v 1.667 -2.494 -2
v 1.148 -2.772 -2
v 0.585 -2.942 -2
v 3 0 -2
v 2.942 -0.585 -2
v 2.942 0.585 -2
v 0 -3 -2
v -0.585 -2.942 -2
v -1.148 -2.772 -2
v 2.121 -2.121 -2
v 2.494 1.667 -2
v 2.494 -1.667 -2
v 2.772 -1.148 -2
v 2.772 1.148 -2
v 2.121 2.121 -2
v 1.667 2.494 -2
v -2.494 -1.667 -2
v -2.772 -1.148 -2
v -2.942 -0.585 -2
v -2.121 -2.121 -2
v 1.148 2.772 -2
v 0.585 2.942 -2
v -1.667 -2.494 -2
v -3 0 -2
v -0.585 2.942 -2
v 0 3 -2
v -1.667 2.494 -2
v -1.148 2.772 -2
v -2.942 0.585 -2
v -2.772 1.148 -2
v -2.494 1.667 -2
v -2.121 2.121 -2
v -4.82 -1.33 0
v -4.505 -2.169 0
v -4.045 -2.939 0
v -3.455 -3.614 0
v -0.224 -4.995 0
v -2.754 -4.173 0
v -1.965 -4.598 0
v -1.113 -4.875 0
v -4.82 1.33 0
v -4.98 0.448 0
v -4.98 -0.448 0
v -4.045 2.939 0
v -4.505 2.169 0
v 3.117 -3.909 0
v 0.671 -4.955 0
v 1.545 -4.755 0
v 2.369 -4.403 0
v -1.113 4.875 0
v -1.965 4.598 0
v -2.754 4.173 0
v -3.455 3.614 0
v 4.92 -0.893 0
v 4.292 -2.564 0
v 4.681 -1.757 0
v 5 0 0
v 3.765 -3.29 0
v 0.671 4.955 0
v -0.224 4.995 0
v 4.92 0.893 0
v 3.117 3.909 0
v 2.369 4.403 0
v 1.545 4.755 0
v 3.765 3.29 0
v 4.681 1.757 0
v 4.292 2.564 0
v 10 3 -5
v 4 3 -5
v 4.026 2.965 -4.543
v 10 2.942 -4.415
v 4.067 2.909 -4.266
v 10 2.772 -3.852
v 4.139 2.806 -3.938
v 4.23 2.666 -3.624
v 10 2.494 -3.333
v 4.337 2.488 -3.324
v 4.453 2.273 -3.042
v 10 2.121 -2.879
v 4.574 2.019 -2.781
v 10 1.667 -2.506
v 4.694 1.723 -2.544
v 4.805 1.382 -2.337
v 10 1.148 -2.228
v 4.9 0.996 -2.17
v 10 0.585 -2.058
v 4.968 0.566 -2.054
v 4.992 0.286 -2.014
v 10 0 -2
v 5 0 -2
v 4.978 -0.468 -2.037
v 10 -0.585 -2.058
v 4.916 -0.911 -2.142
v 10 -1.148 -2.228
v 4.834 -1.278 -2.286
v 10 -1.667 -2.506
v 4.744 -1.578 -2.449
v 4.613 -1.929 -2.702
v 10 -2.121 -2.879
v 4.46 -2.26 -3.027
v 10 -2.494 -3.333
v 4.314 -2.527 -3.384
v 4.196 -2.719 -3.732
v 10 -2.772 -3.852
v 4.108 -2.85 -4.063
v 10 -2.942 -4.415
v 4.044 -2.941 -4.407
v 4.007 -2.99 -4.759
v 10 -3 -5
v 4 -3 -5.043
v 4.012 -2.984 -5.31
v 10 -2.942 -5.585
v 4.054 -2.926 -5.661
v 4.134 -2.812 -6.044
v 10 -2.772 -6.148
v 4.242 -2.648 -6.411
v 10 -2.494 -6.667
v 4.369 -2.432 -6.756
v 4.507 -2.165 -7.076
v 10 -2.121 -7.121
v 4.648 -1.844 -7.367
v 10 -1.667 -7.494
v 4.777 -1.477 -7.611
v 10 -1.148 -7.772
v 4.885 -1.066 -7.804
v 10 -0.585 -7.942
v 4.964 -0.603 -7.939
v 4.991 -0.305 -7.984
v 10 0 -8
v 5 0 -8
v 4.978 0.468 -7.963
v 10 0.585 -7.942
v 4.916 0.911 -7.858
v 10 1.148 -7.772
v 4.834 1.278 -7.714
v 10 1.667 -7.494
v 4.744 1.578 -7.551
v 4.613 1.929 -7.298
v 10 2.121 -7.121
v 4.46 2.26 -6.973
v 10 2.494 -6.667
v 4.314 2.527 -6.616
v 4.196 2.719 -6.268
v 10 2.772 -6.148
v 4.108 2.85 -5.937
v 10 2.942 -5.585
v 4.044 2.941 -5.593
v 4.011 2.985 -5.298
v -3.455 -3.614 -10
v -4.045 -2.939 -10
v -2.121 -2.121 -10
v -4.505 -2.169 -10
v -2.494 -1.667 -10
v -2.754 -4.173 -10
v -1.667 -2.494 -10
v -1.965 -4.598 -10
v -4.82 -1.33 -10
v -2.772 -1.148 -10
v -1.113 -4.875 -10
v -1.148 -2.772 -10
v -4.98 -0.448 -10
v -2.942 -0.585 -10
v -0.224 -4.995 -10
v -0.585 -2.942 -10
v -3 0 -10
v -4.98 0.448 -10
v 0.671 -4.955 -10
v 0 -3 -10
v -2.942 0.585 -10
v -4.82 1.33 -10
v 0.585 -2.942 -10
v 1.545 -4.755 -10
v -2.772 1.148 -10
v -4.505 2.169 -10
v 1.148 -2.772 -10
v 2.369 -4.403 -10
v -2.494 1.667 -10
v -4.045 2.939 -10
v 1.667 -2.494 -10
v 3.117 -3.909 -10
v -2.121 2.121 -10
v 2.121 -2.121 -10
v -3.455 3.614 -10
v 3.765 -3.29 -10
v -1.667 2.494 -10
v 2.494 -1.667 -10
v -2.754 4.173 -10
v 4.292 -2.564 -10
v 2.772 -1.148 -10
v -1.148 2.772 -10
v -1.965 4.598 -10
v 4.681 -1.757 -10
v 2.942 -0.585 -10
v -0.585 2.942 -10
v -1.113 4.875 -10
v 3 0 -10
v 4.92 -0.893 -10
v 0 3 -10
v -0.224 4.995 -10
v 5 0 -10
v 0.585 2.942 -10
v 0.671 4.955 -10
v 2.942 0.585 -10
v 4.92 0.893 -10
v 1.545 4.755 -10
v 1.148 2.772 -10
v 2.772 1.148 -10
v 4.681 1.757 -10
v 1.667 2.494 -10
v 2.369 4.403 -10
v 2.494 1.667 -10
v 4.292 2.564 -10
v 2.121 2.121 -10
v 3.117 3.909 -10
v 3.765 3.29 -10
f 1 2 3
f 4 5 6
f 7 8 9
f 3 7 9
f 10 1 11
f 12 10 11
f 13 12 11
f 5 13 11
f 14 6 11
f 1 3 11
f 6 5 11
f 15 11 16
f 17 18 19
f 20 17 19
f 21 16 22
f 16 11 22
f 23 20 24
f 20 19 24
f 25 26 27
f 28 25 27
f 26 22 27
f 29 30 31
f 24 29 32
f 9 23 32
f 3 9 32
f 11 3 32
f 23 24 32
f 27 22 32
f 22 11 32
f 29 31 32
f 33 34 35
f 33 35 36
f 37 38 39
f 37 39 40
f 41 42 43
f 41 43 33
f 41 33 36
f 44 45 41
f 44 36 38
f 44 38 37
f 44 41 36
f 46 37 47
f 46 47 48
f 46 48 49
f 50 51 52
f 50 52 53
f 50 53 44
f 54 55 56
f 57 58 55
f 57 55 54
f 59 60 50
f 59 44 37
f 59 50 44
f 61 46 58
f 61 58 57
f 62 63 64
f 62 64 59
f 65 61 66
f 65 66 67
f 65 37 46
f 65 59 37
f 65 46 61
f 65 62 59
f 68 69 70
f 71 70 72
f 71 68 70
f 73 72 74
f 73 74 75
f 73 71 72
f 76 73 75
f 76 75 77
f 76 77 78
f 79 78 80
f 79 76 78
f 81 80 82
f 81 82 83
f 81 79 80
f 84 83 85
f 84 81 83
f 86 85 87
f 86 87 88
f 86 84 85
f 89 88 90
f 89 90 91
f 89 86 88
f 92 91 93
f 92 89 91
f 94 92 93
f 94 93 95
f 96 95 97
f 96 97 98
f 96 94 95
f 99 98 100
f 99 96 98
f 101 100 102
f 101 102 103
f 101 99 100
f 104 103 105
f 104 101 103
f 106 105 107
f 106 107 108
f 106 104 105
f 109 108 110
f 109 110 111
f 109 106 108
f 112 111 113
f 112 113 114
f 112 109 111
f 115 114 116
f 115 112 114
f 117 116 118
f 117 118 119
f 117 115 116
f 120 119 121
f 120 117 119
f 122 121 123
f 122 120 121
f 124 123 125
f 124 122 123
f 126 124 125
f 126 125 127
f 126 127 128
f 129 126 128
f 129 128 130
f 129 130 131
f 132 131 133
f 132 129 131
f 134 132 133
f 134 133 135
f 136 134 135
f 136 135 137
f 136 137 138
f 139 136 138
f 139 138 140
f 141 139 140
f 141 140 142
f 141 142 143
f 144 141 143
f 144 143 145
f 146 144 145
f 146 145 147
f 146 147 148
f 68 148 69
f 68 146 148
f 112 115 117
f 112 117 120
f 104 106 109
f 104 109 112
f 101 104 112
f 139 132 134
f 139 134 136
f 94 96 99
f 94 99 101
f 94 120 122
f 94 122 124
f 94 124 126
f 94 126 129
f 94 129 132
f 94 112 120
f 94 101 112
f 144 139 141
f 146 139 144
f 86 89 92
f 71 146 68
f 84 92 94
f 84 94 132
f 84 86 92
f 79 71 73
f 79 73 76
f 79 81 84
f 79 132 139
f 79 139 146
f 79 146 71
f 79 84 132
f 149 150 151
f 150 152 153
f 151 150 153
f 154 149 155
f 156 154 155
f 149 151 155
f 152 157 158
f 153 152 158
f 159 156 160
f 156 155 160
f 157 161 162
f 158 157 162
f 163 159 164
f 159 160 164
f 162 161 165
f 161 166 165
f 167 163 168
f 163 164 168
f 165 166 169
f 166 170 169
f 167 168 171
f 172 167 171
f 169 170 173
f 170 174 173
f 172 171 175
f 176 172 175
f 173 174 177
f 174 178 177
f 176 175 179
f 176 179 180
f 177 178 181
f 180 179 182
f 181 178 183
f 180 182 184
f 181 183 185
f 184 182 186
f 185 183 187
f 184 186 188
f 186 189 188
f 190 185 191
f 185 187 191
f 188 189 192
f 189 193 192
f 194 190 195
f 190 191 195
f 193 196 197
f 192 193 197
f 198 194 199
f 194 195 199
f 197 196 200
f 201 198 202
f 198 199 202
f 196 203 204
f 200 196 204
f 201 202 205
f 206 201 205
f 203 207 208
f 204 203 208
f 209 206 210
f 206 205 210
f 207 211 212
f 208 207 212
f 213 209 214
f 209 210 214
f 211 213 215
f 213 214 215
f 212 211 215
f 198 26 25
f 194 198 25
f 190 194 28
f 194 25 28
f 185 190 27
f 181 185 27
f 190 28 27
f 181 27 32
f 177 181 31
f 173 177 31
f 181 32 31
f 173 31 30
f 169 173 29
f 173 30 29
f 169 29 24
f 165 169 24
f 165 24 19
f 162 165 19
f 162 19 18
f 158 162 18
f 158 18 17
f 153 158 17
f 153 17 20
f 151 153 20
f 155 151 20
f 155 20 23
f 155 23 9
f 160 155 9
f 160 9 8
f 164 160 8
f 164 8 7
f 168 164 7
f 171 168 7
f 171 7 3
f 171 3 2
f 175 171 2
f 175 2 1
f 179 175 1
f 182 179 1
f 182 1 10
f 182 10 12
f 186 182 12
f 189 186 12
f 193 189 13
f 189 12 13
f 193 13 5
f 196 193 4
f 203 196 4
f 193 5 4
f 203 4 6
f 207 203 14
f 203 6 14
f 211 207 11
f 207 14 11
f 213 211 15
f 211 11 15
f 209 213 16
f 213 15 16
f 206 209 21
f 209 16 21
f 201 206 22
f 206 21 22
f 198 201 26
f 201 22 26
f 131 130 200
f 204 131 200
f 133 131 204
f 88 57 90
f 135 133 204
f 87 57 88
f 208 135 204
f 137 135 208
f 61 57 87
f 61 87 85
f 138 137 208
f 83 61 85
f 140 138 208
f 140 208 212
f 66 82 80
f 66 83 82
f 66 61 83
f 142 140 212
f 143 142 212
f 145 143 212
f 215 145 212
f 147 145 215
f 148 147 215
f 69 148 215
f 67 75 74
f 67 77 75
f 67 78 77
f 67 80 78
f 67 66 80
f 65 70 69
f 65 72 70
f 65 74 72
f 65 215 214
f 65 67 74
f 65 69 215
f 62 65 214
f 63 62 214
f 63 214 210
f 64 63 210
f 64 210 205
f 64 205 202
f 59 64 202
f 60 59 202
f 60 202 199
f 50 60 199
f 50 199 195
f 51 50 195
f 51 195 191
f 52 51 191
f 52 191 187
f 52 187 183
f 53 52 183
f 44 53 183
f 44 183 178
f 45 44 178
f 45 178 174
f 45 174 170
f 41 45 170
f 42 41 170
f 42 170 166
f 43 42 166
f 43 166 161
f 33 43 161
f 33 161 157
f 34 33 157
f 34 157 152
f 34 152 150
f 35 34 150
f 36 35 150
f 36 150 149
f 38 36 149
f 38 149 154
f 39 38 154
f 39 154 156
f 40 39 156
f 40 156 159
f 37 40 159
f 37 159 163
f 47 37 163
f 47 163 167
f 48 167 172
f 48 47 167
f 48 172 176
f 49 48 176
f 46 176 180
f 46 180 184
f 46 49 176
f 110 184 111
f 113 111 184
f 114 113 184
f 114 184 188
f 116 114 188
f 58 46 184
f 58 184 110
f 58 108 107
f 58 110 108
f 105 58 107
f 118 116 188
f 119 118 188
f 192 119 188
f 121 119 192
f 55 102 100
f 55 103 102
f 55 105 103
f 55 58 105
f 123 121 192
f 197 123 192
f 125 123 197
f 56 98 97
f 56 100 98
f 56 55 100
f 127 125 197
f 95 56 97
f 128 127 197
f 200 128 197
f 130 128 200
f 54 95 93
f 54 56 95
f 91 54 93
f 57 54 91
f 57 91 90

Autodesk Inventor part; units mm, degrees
ref_plane "XZ Plane" through (0, 0, 0) normal (0, 1, 0) x (-1, 0, 0)
ref_plane "XY Plane" through (0, 0, 0) normal (0, 0, 1) x (1, 0, 0)
sketch "Sketch1" plane through (0, 0, 0) normal (0, 0, 1) x (1, 0, 0)
  circle A0 centre (0, 0) radius 5
  dimension "d0" = 10
extrude "Extrusion1" add sketch "Sketch1" against normal blind 10
sketch "Sketch2" plane through (0, 0, -10) normal (0, 0, -1) x (-1, 0, 0)
  circle A0 centre (0, 0) radius 5 projected
hole "Hole1" at (0, 0, -10) direction (0, 0, 1) diameter 6 depth 8
ref_plane "Work Plane1" through (10, 0, 0) normal (1, 0, 0) x (0, 1, 0)
sketch "Sketch3" plane through (10, 0, 0) normal (1, 0, 0) x (0, 1, 0)
  circle A0 centre (0, -5) radius 3
  line L0 (5, 0) -> (5, -10) projected
  point P0 (0, 0)
  point P1 (5, -5)
  dimension "d11" = 6
extrude "Extrusion2" add sketch "Sketch3" against normal up to surface
properties part number "verbindungoben"
